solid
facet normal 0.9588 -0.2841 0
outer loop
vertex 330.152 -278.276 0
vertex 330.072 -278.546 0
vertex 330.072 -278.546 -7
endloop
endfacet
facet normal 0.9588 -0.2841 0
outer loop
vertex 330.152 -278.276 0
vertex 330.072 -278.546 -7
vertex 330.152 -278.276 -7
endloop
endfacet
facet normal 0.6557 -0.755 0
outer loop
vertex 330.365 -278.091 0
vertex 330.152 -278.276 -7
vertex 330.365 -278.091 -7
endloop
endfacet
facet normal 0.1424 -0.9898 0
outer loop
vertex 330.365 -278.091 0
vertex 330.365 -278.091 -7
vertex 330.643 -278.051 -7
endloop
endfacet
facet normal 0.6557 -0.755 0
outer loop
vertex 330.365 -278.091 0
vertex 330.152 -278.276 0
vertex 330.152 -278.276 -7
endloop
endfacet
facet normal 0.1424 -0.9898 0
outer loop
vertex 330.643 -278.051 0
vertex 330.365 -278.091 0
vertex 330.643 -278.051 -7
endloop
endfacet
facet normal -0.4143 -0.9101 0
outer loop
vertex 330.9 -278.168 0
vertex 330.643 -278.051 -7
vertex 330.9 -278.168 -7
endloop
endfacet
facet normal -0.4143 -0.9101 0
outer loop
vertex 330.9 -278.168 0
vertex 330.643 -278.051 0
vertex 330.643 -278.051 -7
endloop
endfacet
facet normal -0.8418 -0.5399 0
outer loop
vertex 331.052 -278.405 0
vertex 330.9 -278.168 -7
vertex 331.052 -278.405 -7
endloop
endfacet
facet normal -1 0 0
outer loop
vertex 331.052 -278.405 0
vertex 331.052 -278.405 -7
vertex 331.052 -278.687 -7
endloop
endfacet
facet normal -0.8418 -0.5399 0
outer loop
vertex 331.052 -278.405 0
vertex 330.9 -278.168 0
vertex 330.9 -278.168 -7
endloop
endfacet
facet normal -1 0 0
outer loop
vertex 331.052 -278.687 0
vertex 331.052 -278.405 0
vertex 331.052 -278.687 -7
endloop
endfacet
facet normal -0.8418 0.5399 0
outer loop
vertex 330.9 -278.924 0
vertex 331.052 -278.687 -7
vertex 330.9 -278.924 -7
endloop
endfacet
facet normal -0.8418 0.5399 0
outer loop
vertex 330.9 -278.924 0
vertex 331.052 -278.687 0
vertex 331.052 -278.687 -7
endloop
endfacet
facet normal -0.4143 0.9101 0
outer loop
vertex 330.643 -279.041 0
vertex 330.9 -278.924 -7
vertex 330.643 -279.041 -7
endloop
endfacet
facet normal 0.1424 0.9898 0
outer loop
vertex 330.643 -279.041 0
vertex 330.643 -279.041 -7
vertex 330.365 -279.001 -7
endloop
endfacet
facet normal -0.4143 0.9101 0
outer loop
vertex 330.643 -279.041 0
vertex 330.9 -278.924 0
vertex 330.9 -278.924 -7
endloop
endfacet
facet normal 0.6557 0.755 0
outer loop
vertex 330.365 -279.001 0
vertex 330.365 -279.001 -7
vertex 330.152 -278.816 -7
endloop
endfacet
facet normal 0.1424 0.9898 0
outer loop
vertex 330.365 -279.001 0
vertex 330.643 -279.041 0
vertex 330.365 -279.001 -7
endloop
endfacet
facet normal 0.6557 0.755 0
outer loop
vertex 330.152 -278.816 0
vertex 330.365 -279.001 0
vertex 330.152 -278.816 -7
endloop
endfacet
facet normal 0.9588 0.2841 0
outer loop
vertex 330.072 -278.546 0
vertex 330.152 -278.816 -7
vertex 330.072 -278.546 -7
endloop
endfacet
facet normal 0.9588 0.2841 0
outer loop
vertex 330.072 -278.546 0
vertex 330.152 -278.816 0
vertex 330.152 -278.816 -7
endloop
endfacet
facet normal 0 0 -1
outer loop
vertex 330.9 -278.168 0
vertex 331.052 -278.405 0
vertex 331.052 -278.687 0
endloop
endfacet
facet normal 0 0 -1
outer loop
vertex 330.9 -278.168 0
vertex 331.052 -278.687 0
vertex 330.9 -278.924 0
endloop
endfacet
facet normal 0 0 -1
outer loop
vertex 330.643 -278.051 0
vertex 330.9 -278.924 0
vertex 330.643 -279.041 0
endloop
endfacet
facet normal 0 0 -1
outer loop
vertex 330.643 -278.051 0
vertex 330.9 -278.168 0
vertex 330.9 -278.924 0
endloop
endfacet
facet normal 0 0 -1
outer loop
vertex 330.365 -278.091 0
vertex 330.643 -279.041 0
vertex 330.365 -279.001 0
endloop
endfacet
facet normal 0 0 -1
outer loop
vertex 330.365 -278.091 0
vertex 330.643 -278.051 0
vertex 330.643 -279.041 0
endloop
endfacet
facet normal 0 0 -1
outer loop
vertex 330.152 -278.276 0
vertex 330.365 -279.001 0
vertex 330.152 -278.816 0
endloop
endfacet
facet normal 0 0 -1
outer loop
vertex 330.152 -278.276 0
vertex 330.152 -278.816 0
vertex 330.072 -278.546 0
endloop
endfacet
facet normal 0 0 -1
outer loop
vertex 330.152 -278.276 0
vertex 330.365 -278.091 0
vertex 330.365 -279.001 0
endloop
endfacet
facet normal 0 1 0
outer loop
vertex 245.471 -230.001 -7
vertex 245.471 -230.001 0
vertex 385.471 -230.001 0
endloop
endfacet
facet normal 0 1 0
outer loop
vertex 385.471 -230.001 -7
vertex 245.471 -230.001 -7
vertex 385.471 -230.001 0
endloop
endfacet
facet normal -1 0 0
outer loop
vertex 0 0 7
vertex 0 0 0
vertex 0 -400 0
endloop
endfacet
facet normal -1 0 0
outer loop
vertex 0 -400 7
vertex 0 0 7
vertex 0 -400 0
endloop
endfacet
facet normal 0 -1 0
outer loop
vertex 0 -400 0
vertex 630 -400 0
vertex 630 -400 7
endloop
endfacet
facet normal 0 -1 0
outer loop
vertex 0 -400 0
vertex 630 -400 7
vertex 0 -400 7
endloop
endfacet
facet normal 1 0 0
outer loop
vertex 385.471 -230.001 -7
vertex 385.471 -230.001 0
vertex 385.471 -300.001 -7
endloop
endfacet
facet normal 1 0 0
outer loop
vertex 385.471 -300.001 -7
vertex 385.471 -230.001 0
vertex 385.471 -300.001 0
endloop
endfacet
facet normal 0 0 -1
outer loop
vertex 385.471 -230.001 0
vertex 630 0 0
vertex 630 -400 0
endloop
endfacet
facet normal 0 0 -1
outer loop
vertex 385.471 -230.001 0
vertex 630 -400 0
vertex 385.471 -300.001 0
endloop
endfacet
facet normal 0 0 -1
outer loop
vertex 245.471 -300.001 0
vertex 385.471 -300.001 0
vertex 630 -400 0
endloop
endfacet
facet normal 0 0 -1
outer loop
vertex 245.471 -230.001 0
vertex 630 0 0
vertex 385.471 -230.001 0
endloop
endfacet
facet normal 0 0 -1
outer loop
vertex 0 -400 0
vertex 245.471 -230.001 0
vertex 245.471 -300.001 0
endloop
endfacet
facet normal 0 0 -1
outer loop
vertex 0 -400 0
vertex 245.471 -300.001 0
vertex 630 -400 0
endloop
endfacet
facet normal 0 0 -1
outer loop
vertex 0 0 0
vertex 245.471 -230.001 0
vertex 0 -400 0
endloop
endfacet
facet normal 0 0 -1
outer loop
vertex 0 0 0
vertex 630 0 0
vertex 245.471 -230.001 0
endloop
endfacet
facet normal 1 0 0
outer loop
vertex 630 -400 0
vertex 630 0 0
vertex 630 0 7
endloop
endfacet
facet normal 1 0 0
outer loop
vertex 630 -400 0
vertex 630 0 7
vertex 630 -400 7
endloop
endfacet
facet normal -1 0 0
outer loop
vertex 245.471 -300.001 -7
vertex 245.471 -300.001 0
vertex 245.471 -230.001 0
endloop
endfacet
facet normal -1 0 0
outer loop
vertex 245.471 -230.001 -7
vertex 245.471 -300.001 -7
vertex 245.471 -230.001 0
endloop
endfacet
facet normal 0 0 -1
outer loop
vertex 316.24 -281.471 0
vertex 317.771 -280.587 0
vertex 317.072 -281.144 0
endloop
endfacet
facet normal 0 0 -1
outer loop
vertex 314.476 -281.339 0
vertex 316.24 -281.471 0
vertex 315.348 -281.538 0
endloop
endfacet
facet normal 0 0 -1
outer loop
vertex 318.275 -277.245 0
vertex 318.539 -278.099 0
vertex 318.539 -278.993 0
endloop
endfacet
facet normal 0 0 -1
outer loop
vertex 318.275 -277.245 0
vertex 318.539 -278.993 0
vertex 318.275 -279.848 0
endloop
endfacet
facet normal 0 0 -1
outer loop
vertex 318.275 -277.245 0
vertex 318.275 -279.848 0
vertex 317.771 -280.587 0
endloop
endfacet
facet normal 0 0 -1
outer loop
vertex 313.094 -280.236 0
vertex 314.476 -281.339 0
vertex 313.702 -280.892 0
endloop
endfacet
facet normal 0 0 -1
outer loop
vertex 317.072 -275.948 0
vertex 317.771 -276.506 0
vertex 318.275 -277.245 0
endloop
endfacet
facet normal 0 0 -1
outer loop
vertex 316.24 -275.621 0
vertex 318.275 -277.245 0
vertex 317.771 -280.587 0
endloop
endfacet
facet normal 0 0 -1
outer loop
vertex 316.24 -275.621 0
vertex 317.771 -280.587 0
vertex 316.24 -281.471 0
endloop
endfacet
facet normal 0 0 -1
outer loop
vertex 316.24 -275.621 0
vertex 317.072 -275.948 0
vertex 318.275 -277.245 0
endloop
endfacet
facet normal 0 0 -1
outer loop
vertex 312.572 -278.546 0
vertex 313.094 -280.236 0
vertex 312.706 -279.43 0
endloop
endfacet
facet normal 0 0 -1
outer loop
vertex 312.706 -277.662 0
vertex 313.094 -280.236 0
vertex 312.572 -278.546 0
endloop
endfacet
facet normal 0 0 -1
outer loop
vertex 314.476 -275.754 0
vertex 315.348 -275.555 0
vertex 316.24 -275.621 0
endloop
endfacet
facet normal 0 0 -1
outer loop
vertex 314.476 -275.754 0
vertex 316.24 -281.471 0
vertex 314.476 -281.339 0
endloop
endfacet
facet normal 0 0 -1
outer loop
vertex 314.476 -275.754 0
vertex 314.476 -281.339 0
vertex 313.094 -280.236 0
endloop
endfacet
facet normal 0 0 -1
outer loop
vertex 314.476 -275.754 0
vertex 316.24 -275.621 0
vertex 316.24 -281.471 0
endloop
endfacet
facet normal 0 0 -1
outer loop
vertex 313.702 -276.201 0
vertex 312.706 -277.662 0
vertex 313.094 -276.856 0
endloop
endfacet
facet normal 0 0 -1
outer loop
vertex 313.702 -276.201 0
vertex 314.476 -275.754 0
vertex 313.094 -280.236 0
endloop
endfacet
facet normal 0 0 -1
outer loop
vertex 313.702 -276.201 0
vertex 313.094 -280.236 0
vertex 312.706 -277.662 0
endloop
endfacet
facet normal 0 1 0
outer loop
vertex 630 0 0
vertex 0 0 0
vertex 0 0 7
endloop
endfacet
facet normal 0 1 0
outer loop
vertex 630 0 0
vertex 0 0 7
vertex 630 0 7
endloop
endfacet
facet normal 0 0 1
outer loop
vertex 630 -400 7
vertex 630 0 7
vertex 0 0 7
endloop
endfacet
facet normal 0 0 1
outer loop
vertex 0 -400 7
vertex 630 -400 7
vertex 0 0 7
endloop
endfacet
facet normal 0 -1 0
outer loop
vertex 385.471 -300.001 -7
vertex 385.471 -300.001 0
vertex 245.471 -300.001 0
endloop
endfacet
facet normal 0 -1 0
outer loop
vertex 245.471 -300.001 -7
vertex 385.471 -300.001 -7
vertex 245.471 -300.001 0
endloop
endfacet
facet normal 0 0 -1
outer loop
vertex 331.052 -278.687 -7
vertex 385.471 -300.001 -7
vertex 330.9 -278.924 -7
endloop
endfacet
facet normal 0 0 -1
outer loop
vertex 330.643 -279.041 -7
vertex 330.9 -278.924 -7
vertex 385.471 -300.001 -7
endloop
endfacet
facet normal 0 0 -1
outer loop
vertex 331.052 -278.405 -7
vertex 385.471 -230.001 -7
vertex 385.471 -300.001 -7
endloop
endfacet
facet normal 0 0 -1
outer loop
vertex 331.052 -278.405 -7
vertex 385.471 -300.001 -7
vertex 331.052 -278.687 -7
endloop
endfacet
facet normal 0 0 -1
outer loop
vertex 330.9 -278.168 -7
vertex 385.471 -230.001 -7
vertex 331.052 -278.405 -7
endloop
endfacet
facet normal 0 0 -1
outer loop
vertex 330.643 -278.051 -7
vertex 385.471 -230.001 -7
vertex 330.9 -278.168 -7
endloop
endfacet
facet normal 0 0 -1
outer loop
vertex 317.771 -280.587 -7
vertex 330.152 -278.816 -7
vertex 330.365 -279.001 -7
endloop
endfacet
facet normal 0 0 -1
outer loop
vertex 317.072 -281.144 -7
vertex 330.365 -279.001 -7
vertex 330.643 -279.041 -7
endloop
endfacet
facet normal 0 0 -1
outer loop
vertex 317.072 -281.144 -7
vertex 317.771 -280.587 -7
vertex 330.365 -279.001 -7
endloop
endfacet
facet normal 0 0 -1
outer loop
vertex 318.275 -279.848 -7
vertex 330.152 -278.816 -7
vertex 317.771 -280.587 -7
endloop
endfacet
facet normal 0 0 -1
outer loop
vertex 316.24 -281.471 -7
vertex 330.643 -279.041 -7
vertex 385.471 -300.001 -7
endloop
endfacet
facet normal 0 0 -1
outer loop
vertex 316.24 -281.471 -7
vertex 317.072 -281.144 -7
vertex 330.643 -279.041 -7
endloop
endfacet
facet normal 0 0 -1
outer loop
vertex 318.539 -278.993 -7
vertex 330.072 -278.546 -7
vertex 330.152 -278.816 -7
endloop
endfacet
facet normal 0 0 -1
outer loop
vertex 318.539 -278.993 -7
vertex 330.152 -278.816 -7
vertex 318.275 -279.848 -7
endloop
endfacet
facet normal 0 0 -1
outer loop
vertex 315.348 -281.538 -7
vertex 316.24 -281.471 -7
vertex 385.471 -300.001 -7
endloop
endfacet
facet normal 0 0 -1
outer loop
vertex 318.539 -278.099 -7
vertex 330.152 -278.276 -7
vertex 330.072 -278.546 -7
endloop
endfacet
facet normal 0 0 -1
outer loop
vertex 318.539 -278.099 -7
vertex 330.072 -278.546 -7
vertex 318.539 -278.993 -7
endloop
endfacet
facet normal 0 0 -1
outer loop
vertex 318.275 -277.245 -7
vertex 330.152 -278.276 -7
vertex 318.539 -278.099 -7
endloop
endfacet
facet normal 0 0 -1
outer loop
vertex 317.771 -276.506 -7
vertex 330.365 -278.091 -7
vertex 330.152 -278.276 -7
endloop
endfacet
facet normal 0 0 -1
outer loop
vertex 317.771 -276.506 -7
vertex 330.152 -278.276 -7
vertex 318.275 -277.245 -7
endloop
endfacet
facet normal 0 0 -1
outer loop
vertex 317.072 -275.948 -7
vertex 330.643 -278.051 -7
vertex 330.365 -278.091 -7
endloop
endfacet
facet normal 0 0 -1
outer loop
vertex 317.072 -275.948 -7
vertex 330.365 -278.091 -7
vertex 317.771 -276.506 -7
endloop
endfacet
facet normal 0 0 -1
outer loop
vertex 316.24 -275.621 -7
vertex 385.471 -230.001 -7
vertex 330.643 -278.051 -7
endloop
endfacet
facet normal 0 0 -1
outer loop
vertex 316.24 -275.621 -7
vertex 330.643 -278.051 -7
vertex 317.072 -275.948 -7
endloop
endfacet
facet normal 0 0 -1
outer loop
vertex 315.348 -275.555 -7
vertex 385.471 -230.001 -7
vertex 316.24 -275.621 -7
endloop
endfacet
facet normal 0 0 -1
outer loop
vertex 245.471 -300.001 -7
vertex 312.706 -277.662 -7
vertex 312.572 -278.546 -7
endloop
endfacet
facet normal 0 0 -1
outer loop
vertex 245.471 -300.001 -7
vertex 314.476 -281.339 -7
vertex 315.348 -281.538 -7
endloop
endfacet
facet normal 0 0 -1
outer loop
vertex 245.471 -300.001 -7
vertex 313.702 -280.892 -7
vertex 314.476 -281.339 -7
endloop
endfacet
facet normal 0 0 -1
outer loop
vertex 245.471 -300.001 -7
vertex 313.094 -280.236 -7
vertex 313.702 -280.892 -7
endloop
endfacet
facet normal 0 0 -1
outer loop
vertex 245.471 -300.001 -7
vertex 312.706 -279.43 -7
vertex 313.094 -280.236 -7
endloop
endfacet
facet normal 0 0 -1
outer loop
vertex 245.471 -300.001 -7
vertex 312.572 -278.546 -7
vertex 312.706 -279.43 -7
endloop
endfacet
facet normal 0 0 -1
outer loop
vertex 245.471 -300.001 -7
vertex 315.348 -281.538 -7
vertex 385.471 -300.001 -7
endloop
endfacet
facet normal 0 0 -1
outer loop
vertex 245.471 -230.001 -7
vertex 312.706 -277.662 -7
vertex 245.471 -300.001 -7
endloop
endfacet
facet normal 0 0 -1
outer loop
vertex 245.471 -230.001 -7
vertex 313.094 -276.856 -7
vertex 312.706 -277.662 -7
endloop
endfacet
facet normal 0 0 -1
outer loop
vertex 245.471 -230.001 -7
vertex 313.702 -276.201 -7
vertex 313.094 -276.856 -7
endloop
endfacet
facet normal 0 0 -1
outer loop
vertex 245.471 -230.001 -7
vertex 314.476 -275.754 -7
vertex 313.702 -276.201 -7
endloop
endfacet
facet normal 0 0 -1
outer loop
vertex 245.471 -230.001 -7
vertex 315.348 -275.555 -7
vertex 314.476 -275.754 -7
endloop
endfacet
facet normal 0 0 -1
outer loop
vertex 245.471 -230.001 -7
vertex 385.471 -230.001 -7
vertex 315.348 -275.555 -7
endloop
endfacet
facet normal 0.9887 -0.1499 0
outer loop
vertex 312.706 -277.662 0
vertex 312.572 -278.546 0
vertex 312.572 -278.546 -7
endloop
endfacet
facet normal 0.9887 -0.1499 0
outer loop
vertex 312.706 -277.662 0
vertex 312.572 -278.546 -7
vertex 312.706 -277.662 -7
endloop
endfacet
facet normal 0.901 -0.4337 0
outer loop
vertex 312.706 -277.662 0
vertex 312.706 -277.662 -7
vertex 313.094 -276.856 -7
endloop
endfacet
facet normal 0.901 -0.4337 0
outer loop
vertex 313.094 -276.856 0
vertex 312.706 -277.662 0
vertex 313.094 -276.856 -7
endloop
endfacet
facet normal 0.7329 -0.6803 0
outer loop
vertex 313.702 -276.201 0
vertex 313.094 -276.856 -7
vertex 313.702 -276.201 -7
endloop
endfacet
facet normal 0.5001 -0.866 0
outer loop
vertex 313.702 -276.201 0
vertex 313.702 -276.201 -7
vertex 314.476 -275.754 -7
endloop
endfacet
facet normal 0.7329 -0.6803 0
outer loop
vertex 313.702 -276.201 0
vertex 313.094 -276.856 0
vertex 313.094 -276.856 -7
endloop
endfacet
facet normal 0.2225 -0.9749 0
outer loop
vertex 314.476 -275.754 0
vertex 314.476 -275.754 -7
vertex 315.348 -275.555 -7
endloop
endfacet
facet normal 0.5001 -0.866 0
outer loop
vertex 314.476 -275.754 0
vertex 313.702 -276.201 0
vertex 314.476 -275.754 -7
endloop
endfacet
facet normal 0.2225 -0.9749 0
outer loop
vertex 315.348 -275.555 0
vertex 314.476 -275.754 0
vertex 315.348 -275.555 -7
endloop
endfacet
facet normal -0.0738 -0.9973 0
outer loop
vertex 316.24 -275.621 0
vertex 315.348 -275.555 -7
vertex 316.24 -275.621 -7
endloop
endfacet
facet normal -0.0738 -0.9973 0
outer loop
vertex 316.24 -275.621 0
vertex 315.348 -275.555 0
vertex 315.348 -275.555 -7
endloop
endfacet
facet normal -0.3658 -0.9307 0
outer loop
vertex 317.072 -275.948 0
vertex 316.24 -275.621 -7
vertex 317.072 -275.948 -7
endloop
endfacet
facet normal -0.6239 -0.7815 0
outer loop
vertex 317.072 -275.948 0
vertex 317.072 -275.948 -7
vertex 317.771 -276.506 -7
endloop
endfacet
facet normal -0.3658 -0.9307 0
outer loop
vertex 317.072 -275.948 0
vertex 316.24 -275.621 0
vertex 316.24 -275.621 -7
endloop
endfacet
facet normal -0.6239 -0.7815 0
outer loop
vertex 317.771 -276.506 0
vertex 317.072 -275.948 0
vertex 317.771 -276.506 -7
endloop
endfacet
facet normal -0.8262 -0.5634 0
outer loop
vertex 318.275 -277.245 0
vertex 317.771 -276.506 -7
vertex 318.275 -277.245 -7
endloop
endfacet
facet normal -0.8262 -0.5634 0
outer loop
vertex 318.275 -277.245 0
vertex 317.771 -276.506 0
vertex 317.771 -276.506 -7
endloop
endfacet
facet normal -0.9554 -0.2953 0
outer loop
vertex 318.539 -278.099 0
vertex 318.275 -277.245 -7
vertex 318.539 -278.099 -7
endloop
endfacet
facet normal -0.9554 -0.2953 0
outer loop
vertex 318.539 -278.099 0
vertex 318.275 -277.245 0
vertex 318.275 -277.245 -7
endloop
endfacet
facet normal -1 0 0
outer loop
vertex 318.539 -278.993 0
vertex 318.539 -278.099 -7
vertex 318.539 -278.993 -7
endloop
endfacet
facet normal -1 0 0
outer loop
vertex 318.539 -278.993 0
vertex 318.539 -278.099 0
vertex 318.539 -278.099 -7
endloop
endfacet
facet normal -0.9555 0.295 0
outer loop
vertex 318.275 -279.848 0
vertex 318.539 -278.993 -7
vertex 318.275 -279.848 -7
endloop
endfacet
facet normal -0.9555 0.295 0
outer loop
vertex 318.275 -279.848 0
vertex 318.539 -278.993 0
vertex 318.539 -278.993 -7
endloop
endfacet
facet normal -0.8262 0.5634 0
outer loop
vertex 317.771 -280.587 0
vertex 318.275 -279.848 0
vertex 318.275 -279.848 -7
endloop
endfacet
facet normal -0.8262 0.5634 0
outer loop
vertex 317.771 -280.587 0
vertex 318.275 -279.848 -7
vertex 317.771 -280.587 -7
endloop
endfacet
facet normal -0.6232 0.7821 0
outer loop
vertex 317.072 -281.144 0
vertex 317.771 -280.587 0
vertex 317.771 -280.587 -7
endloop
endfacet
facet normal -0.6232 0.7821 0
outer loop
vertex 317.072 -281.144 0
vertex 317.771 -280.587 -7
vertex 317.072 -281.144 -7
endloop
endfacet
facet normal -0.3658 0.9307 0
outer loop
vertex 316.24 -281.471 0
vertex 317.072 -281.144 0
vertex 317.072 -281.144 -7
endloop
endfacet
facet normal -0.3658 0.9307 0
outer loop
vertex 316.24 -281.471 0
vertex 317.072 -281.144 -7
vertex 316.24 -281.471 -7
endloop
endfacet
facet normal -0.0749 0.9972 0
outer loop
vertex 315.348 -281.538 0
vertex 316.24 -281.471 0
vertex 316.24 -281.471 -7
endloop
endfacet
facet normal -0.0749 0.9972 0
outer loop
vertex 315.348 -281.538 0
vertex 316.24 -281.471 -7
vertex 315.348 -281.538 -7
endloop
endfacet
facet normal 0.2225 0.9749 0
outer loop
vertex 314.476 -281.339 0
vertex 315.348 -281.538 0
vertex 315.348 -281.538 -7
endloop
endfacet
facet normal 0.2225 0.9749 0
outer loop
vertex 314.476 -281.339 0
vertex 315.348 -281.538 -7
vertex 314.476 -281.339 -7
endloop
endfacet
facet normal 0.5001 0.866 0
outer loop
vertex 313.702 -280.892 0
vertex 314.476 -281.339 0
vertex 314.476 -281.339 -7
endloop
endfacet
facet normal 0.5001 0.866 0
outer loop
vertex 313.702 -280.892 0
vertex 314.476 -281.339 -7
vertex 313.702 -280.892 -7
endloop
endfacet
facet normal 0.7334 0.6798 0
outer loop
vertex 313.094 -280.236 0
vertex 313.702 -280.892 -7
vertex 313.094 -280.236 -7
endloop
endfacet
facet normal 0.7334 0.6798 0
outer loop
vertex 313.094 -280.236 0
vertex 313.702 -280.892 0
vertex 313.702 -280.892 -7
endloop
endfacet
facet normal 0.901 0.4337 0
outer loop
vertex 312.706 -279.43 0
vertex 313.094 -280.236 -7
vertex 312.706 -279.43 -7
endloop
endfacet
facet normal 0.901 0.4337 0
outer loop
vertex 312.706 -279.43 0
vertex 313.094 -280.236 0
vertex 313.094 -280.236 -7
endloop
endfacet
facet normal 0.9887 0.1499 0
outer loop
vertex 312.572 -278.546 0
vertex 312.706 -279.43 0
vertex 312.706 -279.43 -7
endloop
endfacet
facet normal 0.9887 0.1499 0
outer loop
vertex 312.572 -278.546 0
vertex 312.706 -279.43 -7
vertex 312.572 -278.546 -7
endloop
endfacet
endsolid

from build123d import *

# Parameters (mm, degrees)
EXTRUDE_1_DEPTH = 7
SKETCH_2_R      = 3
SKETCH_2_R_2    = 0.5
EXTRUDE_2_DEPTH = 7


with BuildPart() as part:
    # 草图1 → 凸台-拉伸1 (new body)
    with BuildSketch(Plane.XY):
        Polygon((0, 0), (630, 0), (630, -400), (0, -400), (0, -18.630210668), align=None)
    extrude(amount=EXTRUDE_1_DEPTH)

    # 草图2 → 凸台-拉伸2 (add)
    with BuildSketch(Plane(origin=(0, 0, 0), x_dir=(-1, 0, 0), z_dir=(0, 0, -1))):
        Polygon((-315.471142347, -300.001109882), (-245.471142347, -300.001109882), (-245.471142347, -250.001109882), (-245.471142347, -230.001109882), (-385.471142347, -230.001109882), (-385.471142347, -300.001109882), align=None)
        with Locations((-315.572226811, -278.546162476)):
            Circle(SKETCH_2_R, mode=Mode.SUBTRACT)
        with Locations((-330.572226811, -278.546162476)):
            Circle(SKETCH_2_R_2, mode=Mode.SUBTRACT)
    extrude(amount=EXTRUDE_2_DEPTH)


solid = part.part
